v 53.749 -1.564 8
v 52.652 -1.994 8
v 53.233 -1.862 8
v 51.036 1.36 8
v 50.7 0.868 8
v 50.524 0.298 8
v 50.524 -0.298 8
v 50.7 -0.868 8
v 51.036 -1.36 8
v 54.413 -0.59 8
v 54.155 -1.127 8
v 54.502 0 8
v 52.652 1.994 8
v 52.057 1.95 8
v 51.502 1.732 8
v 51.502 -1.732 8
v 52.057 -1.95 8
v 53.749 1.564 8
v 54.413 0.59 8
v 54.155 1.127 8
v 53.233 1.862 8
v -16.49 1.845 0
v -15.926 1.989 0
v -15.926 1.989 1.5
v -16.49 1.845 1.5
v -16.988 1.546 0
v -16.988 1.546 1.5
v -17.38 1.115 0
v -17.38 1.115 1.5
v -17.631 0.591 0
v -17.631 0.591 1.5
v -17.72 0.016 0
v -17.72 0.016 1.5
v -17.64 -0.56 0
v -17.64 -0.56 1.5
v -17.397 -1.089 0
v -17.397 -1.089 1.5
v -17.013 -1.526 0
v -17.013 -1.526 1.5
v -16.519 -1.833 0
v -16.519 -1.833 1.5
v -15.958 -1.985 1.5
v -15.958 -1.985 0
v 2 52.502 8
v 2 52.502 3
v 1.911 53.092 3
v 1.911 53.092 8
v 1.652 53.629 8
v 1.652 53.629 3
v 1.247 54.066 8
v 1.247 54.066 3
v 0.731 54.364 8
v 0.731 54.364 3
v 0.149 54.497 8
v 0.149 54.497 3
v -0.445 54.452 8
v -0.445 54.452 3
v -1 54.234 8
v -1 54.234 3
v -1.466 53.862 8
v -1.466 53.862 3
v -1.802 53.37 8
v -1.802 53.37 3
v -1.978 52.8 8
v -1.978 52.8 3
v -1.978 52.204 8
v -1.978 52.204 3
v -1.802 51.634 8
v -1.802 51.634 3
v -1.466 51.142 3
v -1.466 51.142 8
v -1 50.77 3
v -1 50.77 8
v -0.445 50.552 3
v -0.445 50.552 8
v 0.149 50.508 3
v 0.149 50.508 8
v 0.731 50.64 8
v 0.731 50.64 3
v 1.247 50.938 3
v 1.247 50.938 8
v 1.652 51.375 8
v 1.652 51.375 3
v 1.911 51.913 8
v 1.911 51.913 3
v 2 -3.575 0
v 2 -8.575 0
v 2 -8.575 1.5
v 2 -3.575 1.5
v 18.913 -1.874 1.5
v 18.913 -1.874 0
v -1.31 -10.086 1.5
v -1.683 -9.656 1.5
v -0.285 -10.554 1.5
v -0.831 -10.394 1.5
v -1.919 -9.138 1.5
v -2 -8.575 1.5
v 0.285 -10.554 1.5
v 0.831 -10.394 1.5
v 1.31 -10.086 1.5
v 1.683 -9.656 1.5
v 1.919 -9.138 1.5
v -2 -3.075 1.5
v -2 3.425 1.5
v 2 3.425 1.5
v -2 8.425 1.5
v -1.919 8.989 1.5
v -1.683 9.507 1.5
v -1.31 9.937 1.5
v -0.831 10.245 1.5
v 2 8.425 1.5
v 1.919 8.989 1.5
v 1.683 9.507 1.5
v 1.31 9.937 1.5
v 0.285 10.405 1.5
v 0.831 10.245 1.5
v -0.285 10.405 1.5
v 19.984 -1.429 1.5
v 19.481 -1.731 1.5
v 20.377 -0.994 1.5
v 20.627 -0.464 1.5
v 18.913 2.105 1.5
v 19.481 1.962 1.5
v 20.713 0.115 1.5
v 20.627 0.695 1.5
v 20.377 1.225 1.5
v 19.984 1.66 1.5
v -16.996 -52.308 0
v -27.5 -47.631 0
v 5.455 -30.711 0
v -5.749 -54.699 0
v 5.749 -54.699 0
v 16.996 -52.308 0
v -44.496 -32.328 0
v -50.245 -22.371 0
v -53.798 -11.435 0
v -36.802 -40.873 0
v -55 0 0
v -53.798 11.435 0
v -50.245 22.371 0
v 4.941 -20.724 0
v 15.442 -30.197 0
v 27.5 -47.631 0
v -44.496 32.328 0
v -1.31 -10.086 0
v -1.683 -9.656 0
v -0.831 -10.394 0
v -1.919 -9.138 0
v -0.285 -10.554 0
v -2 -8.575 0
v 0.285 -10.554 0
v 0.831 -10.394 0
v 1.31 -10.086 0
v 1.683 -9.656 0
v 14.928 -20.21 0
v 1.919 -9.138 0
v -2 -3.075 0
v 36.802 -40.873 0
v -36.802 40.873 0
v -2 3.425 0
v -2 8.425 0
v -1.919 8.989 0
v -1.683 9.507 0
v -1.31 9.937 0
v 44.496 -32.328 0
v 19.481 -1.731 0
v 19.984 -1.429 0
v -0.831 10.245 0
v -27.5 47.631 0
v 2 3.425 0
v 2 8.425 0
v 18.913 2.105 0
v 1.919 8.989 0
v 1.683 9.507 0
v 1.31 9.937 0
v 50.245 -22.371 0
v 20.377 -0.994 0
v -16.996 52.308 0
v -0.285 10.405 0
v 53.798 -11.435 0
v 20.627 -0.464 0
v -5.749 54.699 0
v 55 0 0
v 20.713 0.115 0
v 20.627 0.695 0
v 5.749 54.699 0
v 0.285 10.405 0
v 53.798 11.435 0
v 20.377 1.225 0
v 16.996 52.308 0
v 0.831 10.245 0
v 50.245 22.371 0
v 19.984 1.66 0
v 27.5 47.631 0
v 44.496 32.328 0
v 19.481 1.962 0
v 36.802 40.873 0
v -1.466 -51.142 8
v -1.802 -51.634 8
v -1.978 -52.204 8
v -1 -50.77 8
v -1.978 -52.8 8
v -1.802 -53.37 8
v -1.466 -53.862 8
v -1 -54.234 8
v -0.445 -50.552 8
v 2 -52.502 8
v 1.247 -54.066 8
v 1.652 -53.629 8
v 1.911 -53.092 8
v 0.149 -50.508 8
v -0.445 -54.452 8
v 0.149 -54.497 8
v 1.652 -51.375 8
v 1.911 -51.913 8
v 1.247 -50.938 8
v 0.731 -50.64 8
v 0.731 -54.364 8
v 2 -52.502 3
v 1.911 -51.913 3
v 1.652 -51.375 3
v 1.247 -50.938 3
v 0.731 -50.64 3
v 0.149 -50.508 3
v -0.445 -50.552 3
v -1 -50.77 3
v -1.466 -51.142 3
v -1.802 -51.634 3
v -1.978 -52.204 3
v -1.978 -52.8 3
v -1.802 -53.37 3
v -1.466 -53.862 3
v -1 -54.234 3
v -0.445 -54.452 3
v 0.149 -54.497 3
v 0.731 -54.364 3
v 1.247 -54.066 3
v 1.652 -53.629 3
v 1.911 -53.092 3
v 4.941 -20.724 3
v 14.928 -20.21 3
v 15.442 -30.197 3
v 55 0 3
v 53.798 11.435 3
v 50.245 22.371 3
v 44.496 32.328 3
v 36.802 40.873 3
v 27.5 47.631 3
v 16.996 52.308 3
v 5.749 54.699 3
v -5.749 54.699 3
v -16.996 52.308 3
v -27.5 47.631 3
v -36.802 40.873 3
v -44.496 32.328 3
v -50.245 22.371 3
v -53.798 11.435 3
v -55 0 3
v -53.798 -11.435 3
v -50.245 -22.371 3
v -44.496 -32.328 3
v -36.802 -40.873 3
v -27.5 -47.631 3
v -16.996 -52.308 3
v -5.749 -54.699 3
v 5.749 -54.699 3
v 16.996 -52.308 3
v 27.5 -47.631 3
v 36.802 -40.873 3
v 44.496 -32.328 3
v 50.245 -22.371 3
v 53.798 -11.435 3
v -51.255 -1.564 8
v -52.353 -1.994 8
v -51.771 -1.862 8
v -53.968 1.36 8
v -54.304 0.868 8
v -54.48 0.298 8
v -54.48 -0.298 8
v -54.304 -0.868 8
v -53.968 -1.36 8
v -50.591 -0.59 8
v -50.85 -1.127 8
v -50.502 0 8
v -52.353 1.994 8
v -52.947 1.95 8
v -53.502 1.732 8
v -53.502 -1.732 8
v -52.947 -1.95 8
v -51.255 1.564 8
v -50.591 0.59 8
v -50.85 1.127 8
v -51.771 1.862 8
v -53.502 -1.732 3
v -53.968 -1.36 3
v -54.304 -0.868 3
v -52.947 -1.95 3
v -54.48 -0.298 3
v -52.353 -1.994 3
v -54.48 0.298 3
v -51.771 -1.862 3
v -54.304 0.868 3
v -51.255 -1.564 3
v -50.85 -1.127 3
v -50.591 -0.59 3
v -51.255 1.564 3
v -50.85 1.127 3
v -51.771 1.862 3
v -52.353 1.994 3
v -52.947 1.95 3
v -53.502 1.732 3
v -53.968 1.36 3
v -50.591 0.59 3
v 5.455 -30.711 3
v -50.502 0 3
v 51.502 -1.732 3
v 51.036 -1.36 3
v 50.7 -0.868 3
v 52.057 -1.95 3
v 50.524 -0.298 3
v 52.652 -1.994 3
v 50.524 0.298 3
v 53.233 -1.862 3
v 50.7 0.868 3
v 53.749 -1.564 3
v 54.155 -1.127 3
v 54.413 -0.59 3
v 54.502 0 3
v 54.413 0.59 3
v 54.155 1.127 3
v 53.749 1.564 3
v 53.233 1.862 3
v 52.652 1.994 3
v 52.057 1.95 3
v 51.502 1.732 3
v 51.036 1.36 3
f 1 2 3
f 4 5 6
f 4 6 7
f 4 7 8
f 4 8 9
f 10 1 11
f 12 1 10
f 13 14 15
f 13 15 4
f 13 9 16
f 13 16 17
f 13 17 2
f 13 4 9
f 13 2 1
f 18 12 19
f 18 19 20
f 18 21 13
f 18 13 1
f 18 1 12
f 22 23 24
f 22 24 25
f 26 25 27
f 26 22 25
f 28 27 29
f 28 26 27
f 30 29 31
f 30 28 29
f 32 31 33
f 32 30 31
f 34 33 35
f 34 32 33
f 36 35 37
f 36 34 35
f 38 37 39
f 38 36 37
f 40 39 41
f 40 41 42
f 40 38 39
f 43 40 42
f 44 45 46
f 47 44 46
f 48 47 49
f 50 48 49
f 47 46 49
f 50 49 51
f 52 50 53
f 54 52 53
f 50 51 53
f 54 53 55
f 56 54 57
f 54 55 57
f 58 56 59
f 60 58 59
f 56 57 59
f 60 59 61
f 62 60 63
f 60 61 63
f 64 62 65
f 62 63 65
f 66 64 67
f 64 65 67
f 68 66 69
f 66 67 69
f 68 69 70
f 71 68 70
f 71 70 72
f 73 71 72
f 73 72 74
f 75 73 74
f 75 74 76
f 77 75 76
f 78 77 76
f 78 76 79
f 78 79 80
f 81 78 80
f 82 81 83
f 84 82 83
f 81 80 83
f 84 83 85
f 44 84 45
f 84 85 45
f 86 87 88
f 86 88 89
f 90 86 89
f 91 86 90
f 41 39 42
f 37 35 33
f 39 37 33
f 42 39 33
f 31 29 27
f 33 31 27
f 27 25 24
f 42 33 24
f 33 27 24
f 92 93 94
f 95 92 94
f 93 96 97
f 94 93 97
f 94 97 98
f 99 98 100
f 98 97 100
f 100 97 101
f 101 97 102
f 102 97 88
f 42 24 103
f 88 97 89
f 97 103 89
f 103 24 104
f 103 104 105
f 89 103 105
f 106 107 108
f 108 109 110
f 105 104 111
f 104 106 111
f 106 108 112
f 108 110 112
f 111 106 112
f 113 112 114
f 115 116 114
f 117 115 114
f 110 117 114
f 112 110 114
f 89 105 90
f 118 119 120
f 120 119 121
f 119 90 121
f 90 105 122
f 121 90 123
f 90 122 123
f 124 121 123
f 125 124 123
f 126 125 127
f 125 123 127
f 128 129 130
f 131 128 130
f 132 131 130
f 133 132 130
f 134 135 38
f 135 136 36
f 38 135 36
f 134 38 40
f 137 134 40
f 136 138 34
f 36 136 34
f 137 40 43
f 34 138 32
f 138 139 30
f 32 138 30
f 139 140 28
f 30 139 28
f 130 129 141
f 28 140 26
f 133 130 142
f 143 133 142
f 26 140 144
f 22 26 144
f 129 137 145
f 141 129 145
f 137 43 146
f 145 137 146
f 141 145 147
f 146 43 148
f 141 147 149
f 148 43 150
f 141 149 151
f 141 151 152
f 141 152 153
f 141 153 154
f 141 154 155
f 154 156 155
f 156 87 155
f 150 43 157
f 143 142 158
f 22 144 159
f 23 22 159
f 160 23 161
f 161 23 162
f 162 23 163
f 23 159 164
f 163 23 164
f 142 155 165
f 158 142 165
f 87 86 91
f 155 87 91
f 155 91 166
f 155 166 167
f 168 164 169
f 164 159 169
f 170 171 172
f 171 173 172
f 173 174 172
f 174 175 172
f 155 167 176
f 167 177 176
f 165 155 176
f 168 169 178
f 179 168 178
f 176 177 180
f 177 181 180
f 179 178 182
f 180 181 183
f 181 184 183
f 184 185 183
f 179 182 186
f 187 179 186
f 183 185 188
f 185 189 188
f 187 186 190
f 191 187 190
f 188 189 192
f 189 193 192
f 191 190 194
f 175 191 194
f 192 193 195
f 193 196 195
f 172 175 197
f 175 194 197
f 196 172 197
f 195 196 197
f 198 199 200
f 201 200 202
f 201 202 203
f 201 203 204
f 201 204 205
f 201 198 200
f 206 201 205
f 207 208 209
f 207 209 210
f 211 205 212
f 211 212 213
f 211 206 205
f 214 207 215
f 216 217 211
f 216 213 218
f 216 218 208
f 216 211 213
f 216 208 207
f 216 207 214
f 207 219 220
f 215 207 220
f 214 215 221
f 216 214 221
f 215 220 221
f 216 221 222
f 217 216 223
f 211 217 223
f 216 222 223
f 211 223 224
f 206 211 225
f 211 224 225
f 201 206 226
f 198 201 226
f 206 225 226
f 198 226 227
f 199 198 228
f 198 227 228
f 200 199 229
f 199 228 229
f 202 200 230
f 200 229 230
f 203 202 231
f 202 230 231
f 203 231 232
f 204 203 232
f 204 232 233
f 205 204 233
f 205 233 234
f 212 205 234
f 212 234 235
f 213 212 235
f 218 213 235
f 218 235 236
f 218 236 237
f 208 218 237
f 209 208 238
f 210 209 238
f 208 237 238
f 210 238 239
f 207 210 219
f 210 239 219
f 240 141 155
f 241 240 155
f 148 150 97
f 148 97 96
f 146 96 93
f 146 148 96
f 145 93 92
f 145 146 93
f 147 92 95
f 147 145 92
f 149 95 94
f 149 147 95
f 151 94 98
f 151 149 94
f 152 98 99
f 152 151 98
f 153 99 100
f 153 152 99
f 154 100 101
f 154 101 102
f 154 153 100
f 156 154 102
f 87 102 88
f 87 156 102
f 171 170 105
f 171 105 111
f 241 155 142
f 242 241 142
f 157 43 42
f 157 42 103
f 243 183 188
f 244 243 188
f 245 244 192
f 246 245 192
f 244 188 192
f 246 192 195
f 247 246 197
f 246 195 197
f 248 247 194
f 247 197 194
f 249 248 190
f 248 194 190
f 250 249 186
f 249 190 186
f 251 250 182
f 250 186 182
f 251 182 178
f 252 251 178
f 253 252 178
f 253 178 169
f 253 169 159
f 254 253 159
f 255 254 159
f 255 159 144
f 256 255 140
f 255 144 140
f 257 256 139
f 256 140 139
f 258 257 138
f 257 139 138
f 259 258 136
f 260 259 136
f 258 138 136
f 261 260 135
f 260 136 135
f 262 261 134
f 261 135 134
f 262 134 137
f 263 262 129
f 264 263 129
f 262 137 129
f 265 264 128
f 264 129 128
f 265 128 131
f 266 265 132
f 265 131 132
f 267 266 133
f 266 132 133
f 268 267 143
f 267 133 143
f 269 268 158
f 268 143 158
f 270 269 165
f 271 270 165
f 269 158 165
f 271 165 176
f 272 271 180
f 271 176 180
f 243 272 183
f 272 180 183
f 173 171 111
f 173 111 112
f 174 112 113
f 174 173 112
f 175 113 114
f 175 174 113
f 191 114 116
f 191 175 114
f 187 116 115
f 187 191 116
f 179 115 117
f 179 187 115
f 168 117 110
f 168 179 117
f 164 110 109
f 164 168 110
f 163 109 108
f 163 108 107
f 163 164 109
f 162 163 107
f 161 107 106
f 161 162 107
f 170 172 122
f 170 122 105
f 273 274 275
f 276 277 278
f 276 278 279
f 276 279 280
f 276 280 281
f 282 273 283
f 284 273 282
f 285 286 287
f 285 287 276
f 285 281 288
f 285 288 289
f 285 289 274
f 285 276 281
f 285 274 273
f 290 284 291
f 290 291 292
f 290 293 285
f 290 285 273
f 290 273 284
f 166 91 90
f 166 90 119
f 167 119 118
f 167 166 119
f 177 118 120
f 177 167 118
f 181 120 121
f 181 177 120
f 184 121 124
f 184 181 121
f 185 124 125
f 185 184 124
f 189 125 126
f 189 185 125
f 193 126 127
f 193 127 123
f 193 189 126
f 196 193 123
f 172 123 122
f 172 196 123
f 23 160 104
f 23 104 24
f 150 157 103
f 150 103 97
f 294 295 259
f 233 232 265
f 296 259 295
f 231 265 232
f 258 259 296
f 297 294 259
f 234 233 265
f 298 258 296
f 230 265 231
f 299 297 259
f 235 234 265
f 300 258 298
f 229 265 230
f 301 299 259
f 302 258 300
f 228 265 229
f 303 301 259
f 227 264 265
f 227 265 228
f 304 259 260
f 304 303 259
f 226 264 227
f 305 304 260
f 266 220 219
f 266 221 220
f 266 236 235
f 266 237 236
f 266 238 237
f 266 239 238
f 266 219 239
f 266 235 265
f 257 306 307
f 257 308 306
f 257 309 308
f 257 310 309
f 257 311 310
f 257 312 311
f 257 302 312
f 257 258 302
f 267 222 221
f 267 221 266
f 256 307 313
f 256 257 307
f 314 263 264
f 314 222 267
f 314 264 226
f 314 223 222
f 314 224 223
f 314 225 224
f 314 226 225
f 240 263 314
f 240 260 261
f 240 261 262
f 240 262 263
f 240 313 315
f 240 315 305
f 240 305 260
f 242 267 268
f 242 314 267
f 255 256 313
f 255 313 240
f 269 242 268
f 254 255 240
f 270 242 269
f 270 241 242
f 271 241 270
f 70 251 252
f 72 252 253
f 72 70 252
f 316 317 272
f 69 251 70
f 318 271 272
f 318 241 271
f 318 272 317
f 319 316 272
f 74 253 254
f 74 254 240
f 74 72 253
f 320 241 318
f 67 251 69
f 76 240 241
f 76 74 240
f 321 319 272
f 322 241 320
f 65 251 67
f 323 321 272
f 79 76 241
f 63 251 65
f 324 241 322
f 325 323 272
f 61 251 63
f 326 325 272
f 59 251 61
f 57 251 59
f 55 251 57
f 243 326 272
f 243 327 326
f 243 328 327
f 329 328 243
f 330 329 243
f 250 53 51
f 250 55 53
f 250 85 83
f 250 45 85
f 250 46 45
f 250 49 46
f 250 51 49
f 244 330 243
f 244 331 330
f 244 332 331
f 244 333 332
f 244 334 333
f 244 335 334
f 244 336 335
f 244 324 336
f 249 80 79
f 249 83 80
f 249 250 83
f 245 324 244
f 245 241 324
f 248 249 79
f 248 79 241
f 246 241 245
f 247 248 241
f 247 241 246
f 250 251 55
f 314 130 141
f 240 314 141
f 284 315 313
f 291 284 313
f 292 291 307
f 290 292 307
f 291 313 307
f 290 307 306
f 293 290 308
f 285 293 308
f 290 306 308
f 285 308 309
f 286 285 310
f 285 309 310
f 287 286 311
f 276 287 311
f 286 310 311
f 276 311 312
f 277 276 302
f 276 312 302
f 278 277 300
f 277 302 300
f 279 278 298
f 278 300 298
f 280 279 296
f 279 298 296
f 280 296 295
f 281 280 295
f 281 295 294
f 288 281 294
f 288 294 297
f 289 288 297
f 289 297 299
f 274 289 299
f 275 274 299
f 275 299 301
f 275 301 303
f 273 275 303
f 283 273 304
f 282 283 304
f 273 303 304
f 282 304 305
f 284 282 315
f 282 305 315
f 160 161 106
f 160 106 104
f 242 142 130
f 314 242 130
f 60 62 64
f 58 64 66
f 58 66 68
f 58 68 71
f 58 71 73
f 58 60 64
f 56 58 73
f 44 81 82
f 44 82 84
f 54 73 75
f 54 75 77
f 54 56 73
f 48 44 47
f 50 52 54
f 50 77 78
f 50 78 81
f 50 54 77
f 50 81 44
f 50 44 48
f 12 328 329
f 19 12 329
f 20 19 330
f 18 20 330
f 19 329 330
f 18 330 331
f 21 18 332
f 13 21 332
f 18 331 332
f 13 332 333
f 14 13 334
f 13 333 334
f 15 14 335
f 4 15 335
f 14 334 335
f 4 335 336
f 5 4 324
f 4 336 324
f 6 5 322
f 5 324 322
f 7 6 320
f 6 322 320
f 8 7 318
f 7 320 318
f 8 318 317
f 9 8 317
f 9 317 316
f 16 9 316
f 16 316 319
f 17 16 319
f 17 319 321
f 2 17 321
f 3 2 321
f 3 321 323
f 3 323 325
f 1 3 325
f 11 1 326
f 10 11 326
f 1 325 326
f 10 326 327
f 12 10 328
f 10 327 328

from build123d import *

# Parameters (mm, degrees)
SKETCH1_R           = 55
BOSS_EXTRUDE1_DEPTH = 3
SKETCH2_R           = 2
BOSS_EXTRUDE2_DEPTH = 5
CUT_EXTRUDE2_DEPTH  = 1.5
CUT_EXTRUDE3_DEPTH  = 23.5


with BuildPart() as part:
    # Sketch1 → Boss-Extrude1 (new body)
    with BuildSketch(Plane.XY):
        Circle(SKETCH1_R)
    extrude(amount=BOSS_EXTRUDE1_DEPTH)

    # Sketch2 → Boss-Extrude2 (add)
    with BuildSketch(Plane.XY.offset(3)):
        with Locations((0, 52.50213424)):
            Circle(SKETCH2_R)
        with Locations((52.50213424, 0)):
            Circle(SKETCH2_R)
        with Locations((0, -52.50213424)):
            Circle(SKETCH2_R)
        with Locations((-52.50213424, 0)):
            Circle(SKETCH2_R)
    extrude(amount=BOSS_EXTRUDE2_DEPTH)

    # Sketch5 → Cut-Extrude2 (cut)
    with BuildSketch(Plane(origin=(0, 0, 0), x_dir=(-1, 0, 0), z_dir=(0, 0, -1))):
        with BuildLine():
            Line((-2, 3.425408406), (-2, 8.425408406))
            ThreePointArc((-2, 8.425408406), (0, 10.425408406), (2, 8.425408406))
            Line((2, 8.425408406), (2, 3.425408406))
            Line((2, 3.425408406), (15.926066161, 1.98850852))
            ThreePointArc((15.926066161, 1.98850852), (17.719893525, 0.015831878), (15.957535976, -1.985009349))
            Line((15.957535976, -1.985009349), (2, -3.074591594))
            Line((2, -3.074591594), (2, -8.574591594))
            ThreePointArc((2, -8.574591594), (0, -10.574591594), (-2, -8.574591594))
            Line((-2, -8.574591594), (-2, -3.574591594))
            Line((-2, -3.574591594), (-18.913070191, -1.874440835))
            ThreePointArc((-18.913070191, -1.874440835), (-20.71285333, 0.115332129), (-18.913070191, 2.105105093))
            Line((-18.913070191, 2.105105093), (-2, 3.425408406))
        make_face()
    extrude(amount=-CUT_EXTRUDE2_DEPTH, mode=Mode.SUBTRACT)

    # Sketch7 → Cut-Extrude3 (cut)
    with BuildSketch(Plane(origin=(0, 0, 0), x_dir=(-1, 0, 0), z_dir=(0, 0, -1))):
        Polygon((-14.927590982, -20.209975768), (-15.441616431, -30.196755922), (-5.454836278, -30.710781371), (-4.940810829, -20.724001217), align=None)
    extrude(amount=-CUT_EXTRUDE3_DEPTH, mode=Mode.SUBTRACT)


solid = part.part
